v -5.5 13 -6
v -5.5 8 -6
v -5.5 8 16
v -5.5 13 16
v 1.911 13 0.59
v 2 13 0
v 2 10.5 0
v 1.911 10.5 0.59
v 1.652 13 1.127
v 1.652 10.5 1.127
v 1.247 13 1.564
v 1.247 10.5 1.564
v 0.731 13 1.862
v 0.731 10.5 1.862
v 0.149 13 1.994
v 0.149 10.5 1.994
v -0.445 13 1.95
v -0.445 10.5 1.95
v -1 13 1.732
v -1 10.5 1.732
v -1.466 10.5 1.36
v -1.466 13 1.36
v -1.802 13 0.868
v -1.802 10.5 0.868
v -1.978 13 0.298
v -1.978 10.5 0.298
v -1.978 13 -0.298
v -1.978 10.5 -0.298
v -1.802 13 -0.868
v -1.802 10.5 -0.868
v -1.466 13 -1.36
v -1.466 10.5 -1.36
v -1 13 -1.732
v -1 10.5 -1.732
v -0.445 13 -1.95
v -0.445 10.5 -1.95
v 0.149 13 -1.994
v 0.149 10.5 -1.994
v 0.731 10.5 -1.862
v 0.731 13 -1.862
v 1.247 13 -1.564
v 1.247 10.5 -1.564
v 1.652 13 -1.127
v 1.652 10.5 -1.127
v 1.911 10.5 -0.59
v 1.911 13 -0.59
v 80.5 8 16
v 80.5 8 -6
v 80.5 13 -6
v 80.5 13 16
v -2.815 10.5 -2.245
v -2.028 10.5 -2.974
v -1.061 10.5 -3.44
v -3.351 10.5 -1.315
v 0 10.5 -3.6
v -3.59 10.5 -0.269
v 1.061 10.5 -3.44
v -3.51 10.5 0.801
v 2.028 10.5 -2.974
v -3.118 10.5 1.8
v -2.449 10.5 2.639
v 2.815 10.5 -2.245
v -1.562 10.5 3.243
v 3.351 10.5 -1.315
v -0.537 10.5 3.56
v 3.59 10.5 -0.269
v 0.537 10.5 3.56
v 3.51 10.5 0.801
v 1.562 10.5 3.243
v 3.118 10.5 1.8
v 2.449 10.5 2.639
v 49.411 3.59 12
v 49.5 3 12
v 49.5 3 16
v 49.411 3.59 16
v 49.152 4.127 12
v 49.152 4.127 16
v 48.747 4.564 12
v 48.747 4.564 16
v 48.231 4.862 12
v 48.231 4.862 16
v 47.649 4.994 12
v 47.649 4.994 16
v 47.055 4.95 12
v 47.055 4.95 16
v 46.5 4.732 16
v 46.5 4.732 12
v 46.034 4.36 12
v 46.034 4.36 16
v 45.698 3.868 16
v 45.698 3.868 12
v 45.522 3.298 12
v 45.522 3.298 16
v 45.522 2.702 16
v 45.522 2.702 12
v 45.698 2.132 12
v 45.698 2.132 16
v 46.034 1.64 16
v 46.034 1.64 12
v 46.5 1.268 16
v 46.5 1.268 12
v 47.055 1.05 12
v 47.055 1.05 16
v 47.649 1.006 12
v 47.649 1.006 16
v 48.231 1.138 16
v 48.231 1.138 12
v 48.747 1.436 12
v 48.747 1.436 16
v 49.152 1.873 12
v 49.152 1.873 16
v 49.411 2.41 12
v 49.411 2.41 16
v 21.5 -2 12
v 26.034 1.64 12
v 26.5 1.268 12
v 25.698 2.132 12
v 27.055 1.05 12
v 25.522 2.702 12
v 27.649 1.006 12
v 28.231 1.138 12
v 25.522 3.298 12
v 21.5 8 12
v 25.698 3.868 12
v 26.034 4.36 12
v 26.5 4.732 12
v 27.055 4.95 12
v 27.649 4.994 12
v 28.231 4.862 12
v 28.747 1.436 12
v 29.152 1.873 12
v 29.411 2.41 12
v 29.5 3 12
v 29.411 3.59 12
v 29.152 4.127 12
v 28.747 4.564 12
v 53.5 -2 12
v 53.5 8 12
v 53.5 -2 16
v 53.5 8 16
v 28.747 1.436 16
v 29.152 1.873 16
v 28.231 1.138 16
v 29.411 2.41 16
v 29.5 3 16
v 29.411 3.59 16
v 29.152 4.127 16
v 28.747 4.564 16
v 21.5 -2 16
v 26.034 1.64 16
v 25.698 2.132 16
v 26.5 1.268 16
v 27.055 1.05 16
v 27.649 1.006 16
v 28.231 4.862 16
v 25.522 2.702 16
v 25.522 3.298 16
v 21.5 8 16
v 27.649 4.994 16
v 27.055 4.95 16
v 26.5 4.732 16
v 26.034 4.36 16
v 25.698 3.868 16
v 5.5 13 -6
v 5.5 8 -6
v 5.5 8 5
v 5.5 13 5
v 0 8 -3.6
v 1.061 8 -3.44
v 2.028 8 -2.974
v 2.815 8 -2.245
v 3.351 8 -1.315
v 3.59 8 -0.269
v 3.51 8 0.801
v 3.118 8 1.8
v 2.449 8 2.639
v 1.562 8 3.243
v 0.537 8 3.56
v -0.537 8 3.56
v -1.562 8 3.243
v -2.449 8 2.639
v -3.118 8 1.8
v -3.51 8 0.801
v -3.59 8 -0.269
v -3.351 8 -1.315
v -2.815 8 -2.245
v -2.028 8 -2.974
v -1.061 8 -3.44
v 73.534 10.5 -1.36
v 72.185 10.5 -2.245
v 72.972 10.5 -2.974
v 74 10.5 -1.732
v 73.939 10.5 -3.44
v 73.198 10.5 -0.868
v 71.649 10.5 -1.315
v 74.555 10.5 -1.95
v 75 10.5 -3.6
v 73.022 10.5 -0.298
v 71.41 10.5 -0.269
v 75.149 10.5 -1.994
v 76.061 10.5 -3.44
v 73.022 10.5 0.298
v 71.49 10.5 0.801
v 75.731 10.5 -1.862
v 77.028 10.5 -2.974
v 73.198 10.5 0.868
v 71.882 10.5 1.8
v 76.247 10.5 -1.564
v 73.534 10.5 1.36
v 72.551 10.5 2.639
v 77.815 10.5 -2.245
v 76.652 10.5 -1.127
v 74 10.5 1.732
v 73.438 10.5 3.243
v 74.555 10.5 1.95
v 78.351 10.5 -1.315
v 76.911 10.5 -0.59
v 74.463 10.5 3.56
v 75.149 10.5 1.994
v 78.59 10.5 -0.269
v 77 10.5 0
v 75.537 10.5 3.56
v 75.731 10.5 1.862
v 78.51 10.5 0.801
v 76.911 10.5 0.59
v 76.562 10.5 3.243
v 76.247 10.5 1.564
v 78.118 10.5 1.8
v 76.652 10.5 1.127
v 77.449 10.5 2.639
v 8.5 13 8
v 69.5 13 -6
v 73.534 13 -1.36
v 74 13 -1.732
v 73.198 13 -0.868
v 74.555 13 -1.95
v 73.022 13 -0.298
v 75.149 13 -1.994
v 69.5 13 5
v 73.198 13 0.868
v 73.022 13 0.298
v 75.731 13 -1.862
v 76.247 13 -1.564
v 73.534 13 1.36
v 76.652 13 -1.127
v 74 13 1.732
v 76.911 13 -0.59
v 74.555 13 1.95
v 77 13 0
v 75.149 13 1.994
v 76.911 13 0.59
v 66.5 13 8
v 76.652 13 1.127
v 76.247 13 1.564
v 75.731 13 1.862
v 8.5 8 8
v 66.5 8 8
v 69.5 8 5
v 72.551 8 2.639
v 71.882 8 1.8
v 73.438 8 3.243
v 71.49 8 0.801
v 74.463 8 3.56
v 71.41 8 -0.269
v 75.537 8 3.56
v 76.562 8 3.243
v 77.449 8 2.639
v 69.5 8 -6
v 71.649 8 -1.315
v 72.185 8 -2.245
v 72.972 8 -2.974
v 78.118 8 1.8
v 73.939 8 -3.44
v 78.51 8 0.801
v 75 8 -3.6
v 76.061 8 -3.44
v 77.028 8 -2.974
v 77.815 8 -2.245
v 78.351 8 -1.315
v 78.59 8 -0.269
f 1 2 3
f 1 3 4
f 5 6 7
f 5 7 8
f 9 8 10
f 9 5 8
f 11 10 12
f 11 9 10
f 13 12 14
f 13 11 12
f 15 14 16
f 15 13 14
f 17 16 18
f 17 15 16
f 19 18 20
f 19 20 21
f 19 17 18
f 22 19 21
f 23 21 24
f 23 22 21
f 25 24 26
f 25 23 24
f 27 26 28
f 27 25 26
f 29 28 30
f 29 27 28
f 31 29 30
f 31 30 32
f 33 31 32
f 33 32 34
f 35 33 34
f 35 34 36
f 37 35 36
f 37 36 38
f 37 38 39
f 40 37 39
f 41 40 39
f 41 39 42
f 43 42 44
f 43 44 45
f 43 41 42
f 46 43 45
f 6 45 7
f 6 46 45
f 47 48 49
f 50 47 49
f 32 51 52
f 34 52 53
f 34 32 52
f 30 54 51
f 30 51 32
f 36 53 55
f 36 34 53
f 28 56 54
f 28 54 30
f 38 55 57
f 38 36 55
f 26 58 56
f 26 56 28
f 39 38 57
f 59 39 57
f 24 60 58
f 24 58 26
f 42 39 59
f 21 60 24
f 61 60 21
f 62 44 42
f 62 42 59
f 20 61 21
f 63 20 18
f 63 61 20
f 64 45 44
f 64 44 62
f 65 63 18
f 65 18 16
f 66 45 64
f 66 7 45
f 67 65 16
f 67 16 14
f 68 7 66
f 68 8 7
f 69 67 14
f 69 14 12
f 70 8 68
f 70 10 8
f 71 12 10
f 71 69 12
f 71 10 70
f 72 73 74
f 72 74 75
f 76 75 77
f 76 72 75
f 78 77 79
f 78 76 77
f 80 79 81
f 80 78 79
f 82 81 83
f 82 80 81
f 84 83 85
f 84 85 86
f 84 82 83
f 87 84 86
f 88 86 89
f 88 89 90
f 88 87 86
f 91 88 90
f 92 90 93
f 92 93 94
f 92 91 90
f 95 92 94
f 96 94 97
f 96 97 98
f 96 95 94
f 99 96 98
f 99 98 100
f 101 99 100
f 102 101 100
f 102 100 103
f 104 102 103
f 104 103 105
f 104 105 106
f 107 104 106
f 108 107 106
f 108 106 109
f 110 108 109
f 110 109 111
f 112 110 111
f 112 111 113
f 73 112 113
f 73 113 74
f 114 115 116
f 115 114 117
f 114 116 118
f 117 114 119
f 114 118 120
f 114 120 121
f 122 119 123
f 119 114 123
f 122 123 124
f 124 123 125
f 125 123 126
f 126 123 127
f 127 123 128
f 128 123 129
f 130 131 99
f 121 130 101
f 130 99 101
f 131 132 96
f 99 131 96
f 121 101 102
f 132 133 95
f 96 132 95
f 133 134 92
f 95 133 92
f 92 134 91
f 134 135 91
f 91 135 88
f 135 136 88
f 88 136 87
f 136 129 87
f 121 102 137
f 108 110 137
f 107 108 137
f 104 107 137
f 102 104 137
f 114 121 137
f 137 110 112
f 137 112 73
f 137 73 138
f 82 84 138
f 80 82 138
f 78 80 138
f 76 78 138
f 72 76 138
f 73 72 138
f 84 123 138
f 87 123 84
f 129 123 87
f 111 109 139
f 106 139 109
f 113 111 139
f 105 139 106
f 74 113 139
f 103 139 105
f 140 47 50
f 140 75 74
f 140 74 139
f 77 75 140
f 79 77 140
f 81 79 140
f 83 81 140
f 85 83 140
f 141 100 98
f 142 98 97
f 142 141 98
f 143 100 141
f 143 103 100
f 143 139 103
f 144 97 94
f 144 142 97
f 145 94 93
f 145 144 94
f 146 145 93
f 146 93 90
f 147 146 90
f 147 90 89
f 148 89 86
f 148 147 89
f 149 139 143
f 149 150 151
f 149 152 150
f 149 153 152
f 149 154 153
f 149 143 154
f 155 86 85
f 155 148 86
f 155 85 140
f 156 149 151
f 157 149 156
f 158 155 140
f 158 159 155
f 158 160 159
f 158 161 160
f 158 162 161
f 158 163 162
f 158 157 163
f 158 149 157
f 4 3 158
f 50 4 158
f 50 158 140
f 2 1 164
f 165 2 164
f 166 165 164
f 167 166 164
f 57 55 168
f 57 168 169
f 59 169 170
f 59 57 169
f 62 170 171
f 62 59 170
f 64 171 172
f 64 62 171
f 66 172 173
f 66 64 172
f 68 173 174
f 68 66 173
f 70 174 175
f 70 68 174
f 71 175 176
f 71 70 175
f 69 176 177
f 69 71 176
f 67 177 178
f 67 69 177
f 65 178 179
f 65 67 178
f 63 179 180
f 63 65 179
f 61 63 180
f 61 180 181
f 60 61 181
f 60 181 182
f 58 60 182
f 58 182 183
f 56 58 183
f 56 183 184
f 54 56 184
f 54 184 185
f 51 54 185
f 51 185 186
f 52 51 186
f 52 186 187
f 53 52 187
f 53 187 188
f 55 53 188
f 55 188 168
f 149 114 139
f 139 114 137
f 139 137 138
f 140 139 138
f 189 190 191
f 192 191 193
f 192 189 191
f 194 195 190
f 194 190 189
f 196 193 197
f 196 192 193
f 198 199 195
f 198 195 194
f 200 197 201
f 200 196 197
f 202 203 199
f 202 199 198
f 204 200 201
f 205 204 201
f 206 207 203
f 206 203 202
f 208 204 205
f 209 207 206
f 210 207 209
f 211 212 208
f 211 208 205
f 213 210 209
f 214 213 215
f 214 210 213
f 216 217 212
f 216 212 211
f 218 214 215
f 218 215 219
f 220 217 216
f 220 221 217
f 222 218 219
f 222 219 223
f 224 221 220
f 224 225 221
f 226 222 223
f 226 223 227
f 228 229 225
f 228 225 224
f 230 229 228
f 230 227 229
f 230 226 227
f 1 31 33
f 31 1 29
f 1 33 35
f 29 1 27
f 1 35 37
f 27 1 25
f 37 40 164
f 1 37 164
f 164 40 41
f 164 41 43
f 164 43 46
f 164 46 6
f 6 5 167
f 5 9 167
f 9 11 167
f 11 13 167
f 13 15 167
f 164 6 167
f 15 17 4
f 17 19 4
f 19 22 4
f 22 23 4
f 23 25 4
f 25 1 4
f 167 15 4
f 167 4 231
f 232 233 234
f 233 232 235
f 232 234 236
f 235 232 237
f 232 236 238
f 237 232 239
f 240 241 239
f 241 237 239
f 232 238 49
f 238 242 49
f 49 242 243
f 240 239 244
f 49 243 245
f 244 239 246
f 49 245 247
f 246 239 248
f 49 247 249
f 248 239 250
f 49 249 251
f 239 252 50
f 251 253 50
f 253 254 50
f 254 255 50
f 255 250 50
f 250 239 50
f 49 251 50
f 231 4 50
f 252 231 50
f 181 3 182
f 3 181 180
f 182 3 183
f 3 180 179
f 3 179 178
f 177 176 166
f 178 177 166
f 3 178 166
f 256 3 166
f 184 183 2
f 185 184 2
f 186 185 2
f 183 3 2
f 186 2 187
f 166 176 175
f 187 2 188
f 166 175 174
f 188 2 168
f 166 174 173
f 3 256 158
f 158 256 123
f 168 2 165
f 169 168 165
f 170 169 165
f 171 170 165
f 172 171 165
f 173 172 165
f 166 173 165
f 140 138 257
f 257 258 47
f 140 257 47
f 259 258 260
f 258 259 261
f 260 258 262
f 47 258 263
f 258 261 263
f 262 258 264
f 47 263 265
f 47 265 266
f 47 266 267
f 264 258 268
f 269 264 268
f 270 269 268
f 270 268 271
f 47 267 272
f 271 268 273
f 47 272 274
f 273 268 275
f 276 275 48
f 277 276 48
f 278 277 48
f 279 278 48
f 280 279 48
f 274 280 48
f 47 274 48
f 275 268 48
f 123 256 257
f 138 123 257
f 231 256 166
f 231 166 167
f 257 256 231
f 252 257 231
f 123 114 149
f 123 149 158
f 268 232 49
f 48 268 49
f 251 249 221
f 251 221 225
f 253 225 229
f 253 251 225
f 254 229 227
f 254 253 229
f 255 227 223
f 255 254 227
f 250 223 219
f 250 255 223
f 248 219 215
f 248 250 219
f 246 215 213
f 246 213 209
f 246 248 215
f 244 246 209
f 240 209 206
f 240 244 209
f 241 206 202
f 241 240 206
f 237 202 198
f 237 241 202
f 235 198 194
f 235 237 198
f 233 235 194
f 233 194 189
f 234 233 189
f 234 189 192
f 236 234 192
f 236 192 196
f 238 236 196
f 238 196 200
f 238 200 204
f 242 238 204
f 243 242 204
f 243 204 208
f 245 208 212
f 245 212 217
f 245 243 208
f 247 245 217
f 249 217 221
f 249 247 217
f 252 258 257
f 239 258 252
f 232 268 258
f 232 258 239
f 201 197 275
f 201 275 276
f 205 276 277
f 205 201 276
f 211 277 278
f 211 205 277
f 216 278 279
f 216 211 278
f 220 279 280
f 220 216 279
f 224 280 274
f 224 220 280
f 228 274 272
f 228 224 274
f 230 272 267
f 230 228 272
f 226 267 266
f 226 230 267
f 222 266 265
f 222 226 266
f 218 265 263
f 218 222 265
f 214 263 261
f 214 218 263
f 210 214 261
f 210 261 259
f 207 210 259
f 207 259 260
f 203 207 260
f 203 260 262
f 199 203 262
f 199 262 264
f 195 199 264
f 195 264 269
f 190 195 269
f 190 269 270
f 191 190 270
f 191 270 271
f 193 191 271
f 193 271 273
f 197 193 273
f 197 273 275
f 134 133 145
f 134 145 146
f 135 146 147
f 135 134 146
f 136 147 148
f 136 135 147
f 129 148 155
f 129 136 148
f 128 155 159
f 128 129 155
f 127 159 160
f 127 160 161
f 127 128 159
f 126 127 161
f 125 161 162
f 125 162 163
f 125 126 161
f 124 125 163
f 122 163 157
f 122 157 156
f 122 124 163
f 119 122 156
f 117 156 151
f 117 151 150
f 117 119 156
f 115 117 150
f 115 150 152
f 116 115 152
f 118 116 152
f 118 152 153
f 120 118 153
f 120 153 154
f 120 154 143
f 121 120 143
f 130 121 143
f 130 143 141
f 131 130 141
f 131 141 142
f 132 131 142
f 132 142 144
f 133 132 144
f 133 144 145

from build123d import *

# Parameters (mm, degrees)
BOX062_W          = 5
BOX062_H          = 8
BOX062_DEPTH      = 86
CYLINDER121_R     = 3.6
CYLINDER121_DEPTH = 5
BOX064_W          = 11
BOX064_H          = 5
BOX064_DEPTH      = 14
CYLINDER120_R     = 3.6
CYLINDER120_DEPTH = 5
BOX063_W          = 11
BOX063_H          = 5
BOX063_DEPTH      = 14
TUBE014_R         = 3.6
TUBE014_R_2       = 2
TUBE014_DEPTH     = 2.5
TUBE015_R         = 3.6
TUBE015_R_2       = 2
TUBE015_DEPTH     = 2.5
CYLINDER108_R     = 2
CYLINDER108_DEPTH = 7
CYLINDER107_R     = 2
CYLINDER107_DEPTH = 7
BOX050_W          = 32
BOX050_H          = 10
BOX050_DEPTH      = 4
CHAMFER002_SIZE   = 3


with BuildPart() as cube062:
    # Box062 → Box062 (new body)
    with BuildSketch(Plane(origin=(-5.5, 8, 8), x_dir=(0, 1, 0), z_dir=(1, 0, 0))):
        with Locations((2.5, 4)):
            Rectangle(BOX062_W, BOX062_H)
    extrude(amount=BOX062_DEPTH)


with BuildPart() as cylinder121:
    # Cylinder121 → Cylinder121 (new body)
    with BuildSketch(Plane(origin=(75, -73, 0), x_dir=(0, 0, -1), z_dir=(0, -1, 0))):
        Circle(CYLINDER121_R)
    extrude(amount=CYLINDER121_DEPTH)


with BuildPart() as cut066:
    # Box064 → Box064 (new body)
    with BuildSketch(Plane(origin=(69.5, -78, -6), x_dir=(1, 0, 0), z_dir=(0, 0, 1))):
        with Locations((5.5, 2.5)):
            Rectangle(BOX064_W, BOX064_H)
    extrude(amount=BOX064_DEPTH)

    # Cut066: cut Cylinder121
    add(cylinder121.part, mode=Mode.SUBTRACT)


with BuildPart() as cut066_1:
    # Cut066 placement: moved
    add(cut066.part.moved(Location((0, 86, 0))))


with BuildPart() as cylinder120:
    # Cylinder120 → Cylinder120 (new body)
    with BuildSketch(Plane(origin=(0, -73, 0), x_dir=(0, 0, -1), z_dir=(0, -1, 0))):
        Circle(CYLINDER120_R)
    extrude(amount=CYLINDER120_DEPTH)


with BuildPart() as cut065:
    # Box063 → Box063 (new body)
    with BuildSketch(Plane(origin=(-5.5, -78, -6), x_dir=(1, 0, 0), z_dir=(0, 0, 1))):
        with Locations((5.5, 2.5)):
            Rectangle(BOX063_W, BOX063_H)
    extrude(amount=BOX063_DEPTH)

    # Cut065: cut Cylinder120
    add(cylinder120.part, mode=Mode.SUBTRACT)


with BuildPart() as cut065_1:
    # Cut065 placement: moved
    add(cut065.part.moved(Location((0, 86, 0))))


with BuildPart() as tube014:
    # Tube014 → Tube014 (new body)
    with BuildSketch(Plane.XZ.offset(-13)):
        Circle(TUBE014_R)
        Circle(TUBE014_R_2, mode=Mode.SUBTRACT)
    extrude(amount=TUBE014_DEPTH)


with BuildPart() as tube015:
    # Tube015 → Tube015 (new body)
    with BuildSketch(Plane(origin=(75, 13, 0), x_dir=(1, 0, 0), z_dir=(0, -1, 0))):
        Circle(TUBE015_R)
        Circle(TUBE015_R_2, mode=Mode.SUBTRACT)
    extrude(amount=TUBE015_DEPTH)


with BuildPart() as cylinder108:
    # Cylinder108 → Cylinder108 (new body)
    with BuildSketch(Plane(origin=(28, -68, 7), x_dir=(1, 0, 0), z_dir=(0, 0, 1))):
        Circle(CYLINDER108_R)
    extrude(amount=CYLINDER108_DEPTH)


with BuildPart() as fusion053:
    # Cylinder107 → Cylinder107 (new body)
    with BuildSketch(Plane(origin=(48, -68, 7), x_dir=(1, 0, 0), z_dir=(0, 0, 1))):
        Circle(CYLINDER107_R)
    extrude(amount=CYLINDER107_DEPTH)

    # Fusion053: union Cylinder108
    add(cylinder108.part)


with BuildPart() as fusion053_1:
    # Fusion053 placement: moved
    add(fusion053.part.moved(Location((0, 0, 3))))


with BuildPart() as chamfer002:
    # Box050 → Box050 (new body)
    with BuildSketch(Plane(origin=(22, -73, 13), x_dir=(1, 0, 0), z_dir=(0, 0, 1))):
        with Locations((16, 5)):
            Rectangle(BOX050_W, BOX050_H)
    extrude(amount=BOX050_DEPTH)

    # Cut050: cut Fusion053
    add(fusion053_1.part, mode=Mode.SUBTRACT)


with BuildPart() as chamfer002_1:
    # Cut050 placement: moved
    add(chamfer002.part.moved(Location((-0.5, 71, -1))))

    # Fusion104: union Cube062, Cut066, Cut065, Tube014, Tube015
    add(cube062.part)
    add(cut066_1.part)
    add(cut065_1.part)
    add(tube014.part)
    add(tube015.part)

    # Chamfer002
    chamfer002_edges = [chamfer002_1.edges().sort_by_distance(p)[0] for p in [
        (5.5, 10.5, 8),
        (69.5, 10.5, 8),
    ]]
    chamfer(chamfer002_edges, length=CHAMFER002_SIZE)


solid = chamfer002_1.part
